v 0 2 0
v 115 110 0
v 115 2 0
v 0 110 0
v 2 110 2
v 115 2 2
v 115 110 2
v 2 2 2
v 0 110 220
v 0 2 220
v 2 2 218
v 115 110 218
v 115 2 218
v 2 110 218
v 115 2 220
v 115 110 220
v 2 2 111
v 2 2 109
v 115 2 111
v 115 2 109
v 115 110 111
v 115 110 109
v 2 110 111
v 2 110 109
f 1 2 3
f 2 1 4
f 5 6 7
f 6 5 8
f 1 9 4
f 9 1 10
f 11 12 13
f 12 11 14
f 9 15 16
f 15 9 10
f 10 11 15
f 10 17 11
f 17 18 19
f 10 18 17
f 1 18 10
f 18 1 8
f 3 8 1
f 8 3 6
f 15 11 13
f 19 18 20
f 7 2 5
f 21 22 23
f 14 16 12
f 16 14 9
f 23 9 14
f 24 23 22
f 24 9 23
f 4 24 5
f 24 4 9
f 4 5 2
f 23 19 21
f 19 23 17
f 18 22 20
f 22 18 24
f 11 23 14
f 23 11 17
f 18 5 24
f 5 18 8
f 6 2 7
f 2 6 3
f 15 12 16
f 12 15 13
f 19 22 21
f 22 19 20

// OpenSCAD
// cube([110, 230, 2]);

length = 380;
width = 230;
height = 220;
mid_len = 110;
thickness = 2;


side_len = (length - mid_len) / 2;
half_width = width / 2;


module base_piece() {
    linear_extrude(height = thickness) polygon(points=[
        [0,0], 
        [0, mid_len], 
        [half_width, length-side_len], 
        [width, mid_len], 
        [width, 0], 
        [half_width, -side_len]
    ]);
}

module full_set() {
    base_piece();
    translate([0, 0, height-thickness]) base_piece();


    ht = thickness / 2;
    translate([half_width - ht, -side_len+ht, ht])
        cube([thickness, side_len+ht, height - ht]);
    translate([half_width - ht, mid_len, ht])
        cube([thickness, side_len+ht, height - ht]);

    translate([0, 0, height/2-ht])
        cube([width, mid_len, thickness]);

    cube([half_width, thickness, height/2]);
    translate([half_width, 0, height/2])
        cube([half_width, thickness, height/2]);
    translate([0, mid_len, height/2])
        cube([half_width, thickness, height/2]);
    translate([half_width, mid_len, 0])
        cube([half_width, thickness, height/2]);
        
    cube([thickness, mid_len, height]);
    translate([width-thickness, 0, 0])
        cube([thickness, mid_len, height]);
}


//p_len = sqrt(height ^ 2 + mid_len ^ 2);
//angle = atan(height / mid_len);
//translate([half_width-ht, 0, ht]) rotate([angle-90, 0, 0])
//    cube([width/2+ht, thickness, p_len]);
//
//translate([0, mid_len, ht]) rotate([90-angle, 0, 0])
//    cube([width/2+ht, thickness, p_len]);
//    
//    


// Part 1
module part1() {
    difference() {
        full_set();
        translate([-1, thickness, -1])
            cube([width+2,length,height+2]);
        translate([-1, -side_len-1, -1])
            cube([width/2,length,height+2]);
        
    }
}

module part2() {
    difference() {
        full_set();
        translate([-1, -side_len-1, -1])
            cube([width+2,side_len+1+thickness,height+2]);
        translate([-1, mid_len, -1])
            cube([width+2,side_len+1+thickness,height+2]);
        translate([half_width, -1, -1])
            cube([width+2,length,height+2]);
    }
}

part2();
